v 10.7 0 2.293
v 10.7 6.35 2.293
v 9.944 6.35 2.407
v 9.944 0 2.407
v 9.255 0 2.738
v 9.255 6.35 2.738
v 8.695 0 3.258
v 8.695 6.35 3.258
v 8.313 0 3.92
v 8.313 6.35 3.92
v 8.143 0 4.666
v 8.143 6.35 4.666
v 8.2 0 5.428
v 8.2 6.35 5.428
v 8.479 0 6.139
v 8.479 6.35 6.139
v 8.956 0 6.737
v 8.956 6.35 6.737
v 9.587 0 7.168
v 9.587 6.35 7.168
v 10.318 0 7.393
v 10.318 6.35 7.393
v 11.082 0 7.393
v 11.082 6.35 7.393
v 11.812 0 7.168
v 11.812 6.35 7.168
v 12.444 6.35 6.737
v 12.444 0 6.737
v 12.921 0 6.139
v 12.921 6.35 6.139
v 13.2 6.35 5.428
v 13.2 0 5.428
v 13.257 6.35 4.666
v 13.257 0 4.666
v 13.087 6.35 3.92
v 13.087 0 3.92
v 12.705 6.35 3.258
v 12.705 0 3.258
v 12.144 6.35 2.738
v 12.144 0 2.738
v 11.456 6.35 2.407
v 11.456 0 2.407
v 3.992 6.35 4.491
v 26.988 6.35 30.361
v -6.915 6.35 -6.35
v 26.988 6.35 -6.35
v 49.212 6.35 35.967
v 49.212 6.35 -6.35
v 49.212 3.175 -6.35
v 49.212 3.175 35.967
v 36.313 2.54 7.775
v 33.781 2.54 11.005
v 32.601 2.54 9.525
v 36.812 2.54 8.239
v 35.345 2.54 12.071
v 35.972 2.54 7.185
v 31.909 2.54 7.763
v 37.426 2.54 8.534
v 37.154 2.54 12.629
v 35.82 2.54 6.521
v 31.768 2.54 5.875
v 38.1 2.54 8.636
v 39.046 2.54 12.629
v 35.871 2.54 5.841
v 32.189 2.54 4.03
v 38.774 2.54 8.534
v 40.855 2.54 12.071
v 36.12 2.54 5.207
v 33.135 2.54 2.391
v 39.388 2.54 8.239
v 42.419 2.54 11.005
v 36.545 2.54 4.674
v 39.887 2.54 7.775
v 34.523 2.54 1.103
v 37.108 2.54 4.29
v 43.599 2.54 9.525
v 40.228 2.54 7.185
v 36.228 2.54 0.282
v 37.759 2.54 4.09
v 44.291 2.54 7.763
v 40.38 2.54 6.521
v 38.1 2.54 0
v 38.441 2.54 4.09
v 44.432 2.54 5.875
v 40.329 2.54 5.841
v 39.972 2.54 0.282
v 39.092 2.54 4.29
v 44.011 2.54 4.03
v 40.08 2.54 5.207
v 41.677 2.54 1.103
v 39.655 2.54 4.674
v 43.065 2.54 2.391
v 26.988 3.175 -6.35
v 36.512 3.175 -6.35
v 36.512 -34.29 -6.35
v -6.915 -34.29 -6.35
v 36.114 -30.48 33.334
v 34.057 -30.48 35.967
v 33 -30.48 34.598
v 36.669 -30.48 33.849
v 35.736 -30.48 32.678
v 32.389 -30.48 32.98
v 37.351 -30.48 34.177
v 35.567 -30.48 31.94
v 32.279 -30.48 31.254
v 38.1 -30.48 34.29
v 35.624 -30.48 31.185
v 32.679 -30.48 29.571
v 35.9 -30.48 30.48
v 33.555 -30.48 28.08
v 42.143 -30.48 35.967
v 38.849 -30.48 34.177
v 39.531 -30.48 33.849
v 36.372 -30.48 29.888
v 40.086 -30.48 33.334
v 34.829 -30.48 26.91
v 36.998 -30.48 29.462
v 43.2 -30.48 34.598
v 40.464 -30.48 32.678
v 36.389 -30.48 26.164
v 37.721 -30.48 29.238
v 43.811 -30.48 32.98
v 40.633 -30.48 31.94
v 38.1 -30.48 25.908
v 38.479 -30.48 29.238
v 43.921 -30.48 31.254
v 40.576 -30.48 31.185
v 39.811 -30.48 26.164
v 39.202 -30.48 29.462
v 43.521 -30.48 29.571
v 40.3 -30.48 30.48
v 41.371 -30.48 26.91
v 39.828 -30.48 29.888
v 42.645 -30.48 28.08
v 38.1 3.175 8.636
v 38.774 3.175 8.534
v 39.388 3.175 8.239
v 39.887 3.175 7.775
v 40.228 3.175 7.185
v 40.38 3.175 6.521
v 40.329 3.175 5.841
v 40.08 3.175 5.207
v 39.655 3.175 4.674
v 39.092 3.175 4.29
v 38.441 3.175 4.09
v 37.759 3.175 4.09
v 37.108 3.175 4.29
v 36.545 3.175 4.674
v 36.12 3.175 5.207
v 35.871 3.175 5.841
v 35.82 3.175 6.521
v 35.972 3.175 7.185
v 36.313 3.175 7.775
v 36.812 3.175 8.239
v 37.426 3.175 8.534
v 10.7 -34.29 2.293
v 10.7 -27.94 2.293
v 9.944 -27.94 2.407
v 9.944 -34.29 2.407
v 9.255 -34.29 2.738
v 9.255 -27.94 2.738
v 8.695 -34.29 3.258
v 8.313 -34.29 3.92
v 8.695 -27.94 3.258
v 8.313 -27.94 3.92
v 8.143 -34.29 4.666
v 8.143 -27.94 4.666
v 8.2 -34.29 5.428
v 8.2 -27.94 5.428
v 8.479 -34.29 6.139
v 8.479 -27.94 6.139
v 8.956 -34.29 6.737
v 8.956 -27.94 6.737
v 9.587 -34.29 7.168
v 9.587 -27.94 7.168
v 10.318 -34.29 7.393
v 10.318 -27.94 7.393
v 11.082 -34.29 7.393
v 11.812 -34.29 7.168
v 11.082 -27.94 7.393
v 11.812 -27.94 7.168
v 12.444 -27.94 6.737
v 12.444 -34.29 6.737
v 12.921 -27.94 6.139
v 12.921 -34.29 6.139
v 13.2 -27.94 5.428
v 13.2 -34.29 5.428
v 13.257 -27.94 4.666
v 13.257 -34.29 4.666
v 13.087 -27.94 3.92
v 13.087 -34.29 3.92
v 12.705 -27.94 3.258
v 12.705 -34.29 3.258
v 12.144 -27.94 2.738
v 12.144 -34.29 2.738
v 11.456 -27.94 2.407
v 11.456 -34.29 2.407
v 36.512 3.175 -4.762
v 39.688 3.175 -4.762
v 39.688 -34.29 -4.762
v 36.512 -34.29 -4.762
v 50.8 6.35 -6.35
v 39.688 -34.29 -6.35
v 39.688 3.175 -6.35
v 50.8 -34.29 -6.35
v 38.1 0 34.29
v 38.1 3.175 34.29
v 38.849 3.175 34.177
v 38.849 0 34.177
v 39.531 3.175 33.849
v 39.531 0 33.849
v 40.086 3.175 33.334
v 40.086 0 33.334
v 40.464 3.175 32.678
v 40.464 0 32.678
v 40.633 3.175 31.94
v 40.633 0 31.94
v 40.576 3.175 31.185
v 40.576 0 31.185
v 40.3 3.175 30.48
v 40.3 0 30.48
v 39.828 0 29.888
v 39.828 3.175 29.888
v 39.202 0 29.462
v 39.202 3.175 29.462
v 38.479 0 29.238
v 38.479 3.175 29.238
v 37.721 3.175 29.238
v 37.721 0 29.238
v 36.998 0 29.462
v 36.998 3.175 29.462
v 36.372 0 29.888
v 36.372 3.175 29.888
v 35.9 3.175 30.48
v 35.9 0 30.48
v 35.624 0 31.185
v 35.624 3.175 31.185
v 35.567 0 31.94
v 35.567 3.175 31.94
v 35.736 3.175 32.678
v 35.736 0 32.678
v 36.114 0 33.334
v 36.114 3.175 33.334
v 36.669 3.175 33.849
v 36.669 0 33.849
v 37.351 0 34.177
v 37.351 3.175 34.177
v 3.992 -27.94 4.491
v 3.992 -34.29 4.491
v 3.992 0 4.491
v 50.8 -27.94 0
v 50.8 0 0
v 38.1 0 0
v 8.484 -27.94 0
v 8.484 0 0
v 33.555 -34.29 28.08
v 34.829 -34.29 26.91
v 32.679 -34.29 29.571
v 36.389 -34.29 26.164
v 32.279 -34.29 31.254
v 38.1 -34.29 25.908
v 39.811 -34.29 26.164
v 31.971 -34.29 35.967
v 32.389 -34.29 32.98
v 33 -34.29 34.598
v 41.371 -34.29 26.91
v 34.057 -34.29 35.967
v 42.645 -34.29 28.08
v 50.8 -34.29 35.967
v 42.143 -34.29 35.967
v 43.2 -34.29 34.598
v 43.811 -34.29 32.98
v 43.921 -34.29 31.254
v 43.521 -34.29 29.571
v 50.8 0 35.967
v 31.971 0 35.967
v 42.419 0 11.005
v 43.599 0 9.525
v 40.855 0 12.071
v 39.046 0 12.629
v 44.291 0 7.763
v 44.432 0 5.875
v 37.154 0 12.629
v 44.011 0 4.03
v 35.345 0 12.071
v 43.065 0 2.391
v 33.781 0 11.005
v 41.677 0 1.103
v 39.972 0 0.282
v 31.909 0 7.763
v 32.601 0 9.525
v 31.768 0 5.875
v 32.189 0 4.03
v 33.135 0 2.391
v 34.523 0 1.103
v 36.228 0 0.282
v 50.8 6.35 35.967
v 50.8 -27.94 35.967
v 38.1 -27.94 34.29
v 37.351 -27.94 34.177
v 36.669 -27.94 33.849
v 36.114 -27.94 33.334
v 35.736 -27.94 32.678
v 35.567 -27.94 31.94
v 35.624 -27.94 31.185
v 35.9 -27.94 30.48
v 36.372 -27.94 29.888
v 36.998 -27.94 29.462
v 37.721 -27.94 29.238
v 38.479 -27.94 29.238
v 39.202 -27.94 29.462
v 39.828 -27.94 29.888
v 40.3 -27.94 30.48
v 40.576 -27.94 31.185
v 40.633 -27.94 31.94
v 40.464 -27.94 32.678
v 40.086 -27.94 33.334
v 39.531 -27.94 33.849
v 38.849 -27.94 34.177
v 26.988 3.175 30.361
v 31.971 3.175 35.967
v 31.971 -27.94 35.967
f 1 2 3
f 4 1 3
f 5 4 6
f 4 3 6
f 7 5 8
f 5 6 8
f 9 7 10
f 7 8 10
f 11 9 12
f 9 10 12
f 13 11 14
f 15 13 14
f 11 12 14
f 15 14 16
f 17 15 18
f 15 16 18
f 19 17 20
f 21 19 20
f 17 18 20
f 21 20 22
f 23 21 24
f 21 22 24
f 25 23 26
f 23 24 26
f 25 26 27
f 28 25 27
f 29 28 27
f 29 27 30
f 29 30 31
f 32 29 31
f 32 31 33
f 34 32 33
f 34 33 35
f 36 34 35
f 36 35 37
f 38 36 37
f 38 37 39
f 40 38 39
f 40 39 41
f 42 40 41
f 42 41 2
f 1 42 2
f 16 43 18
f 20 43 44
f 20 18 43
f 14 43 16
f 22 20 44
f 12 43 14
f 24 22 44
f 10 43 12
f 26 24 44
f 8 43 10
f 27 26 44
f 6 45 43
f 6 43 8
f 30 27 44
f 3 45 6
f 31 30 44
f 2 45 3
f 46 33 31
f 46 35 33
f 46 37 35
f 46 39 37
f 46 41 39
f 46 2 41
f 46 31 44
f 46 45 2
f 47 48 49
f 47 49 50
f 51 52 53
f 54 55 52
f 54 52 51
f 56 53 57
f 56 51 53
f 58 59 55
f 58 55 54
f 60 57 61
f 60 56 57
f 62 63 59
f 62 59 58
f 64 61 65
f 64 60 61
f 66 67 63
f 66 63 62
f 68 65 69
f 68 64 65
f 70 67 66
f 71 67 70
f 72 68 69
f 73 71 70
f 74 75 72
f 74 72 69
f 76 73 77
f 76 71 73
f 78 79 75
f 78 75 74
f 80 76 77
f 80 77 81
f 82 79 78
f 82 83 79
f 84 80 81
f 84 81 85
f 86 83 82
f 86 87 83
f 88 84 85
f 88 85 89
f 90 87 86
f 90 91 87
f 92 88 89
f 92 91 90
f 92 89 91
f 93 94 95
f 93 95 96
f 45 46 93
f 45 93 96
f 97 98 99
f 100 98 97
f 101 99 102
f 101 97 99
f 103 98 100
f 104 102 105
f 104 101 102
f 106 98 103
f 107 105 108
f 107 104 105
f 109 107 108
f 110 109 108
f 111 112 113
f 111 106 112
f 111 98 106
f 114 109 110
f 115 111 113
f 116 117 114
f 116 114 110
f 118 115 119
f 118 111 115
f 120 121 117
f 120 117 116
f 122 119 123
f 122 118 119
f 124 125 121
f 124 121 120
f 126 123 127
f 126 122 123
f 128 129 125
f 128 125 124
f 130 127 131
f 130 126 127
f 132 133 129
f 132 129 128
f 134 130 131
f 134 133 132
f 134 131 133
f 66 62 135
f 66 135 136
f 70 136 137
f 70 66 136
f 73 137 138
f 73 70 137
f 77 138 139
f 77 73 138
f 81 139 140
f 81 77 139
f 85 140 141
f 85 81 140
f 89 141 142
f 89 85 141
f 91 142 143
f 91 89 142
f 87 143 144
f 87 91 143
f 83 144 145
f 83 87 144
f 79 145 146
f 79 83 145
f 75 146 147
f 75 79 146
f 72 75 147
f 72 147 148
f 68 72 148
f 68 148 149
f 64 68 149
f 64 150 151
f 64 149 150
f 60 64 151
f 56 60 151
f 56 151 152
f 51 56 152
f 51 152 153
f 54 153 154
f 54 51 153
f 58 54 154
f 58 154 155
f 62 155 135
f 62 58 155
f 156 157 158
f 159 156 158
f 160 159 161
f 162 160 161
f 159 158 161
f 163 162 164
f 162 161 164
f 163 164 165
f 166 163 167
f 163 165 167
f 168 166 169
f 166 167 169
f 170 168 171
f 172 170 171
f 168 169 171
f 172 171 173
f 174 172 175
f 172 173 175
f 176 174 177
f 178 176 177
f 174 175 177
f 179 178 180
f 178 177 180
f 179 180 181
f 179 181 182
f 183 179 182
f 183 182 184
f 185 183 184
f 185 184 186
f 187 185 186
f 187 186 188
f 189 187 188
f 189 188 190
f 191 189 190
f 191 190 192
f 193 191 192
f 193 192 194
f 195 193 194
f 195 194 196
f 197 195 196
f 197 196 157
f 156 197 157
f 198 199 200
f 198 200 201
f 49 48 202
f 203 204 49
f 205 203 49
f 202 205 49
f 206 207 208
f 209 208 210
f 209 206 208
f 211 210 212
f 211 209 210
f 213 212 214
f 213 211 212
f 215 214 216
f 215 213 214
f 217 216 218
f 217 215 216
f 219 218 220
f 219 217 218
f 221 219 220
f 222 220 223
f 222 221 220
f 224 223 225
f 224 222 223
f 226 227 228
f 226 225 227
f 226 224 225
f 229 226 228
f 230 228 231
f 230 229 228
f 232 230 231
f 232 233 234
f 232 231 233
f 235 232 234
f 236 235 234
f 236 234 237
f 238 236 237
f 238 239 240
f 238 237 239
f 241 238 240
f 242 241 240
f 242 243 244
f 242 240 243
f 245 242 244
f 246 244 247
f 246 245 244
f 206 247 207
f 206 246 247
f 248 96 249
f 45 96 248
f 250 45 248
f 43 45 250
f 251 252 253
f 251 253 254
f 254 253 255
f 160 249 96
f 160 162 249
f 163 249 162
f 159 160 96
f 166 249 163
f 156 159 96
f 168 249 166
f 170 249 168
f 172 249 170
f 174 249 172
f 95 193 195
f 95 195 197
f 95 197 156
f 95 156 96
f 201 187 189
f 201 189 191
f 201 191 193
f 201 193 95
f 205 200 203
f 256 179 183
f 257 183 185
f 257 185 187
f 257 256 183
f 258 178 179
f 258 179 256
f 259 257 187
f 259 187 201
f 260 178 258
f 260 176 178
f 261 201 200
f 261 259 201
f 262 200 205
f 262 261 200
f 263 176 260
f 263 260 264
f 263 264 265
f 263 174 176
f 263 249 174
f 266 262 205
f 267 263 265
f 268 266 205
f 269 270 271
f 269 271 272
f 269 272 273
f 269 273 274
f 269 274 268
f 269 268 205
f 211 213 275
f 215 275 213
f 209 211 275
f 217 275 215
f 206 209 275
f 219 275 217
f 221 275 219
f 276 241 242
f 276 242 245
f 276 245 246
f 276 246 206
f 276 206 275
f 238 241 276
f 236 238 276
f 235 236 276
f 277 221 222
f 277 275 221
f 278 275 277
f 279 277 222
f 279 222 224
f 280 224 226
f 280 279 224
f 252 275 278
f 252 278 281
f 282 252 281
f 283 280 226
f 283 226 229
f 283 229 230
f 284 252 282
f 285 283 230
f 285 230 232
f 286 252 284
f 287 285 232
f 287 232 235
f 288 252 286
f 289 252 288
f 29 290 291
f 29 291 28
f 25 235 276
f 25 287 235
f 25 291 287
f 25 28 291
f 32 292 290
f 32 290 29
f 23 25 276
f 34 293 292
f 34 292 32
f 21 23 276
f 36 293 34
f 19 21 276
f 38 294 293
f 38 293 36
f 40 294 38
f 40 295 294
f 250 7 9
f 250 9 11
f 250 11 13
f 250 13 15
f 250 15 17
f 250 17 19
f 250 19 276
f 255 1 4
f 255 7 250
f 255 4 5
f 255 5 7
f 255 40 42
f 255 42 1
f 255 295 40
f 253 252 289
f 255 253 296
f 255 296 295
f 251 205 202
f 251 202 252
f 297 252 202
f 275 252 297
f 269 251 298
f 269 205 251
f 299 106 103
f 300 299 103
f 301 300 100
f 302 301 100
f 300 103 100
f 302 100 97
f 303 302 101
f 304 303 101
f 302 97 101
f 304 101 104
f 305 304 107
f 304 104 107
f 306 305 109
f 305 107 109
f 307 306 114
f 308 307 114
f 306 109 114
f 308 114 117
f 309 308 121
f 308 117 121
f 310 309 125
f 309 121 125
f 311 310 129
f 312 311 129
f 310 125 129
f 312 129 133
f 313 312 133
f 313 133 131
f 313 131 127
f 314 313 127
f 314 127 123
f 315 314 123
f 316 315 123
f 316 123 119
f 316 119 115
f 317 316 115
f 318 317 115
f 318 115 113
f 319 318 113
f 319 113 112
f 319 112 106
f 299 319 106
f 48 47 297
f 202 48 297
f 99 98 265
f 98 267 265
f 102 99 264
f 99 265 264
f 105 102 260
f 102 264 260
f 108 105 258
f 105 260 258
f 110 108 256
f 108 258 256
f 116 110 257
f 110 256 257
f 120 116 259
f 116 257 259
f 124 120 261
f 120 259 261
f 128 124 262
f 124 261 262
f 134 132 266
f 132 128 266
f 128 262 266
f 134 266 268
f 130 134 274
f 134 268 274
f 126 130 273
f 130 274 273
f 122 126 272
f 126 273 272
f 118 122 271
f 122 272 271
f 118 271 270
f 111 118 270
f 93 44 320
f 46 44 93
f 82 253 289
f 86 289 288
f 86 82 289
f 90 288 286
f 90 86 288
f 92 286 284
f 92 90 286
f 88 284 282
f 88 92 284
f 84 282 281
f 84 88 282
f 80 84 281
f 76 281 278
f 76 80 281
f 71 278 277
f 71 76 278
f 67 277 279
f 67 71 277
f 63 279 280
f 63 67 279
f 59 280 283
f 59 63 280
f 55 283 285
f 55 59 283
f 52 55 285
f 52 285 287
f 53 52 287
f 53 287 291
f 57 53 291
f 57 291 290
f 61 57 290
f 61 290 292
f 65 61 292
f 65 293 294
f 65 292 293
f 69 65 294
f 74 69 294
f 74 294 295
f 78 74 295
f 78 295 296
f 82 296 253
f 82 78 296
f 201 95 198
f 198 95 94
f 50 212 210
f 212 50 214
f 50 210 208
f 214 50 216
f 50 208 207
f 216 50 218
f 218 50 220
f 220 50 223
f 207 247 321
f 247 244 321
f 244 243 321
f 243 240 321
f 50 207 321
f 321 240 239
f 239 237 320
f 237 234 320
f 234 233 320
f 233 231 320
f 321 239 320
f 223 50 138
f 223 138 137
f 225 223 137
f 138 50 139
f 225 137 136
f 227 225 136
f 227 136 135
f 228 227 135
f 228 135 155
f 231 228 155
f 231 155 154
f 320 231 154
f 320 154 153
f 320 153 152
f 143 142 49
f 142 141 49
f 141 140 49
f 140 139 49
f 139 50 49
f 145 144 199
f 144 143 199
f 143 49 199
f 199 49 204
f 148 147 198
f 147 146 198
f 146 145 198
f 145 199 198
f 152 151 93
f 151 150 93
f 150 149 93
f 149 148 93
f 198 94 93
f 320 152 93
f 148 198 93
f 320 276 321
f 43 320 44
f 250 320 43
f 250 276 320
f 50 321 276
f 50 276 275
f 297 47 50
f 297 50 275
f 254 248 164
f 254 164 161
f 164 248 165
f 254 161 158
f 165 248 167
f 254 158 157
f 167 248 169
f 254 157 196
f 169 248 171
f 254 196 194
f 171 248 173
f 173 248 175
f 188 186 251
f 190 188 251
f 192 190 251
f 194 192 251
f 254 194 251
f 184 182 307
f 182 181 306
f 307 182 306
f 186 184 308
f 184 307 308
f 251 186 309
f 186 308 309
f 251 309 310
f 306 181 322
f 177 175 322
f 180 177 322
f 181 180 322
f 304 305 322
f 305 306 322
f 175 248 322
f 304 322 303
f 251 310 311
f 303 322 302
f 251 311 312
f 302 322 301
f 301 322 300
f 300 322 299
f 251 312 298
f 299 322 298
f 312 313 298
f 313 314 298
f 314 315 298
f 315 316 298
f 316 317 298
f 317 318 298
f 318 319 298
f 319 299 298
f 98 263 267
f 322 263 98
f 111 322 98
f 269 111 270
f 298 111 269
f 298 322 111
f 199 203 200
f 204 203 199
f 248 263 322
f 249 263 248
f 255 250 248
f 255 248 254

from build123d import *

# Parameters (mm, degrees)
SKETCH2_R               = 2.286
SKETCH2_R_2             = 2.54
BOSS_EXTRUDE1_DEPTH     = 6.35
SKETCH3_W               = 50.8
SKETCH3_H               = 27.94
BOSS_EXTRUDE2_DEPTH     = 6.35
SKETCH5_W               = 50.8
SKETCH5_H               = 6.35
BOSS_EXTRUDE3_DEPTH     = 6.35
CUT_EXTRUDE1_DEPTH      = 38.1
CUT_EXTRUDE1_DEPTH_BACK = 2.54
SKETCH6_R               = 6.35
BOSS_EXTRUDE4_START     = 6.35
SKETCH7_W               = 50.8
SKETCH7_H               = 6.35
SKETCH7_R               = 2.54
BOSS_EXTRUDE4_DEPTH     = 6.35
CUT_EXTRUDE2_DEPTH      = 3.175
SKETCH9_R               = 2.564291027
CUT_EXTRUDE3_DEPTH      = 127
SKETCH11_W              = 3.175
SKETCH11_H              = 37.465
CUT_EXTRUDE4_DEPTH      = 1.5875
SKETCH16_R              = 5.842
CUT_EXTRUDE7_DEPTH      = 3.81
SKETCH17_W              = 19.191430616
SKETCH17_H              = 21.182889484
CUT_EXTRUDE8_DEPTH      = 87.593141183
BOSS_EXTRUDE5_REACH     = 76.336


with BuildPart() as part:
    # Sketch2 → Boss-Extrude1 (new body)
    with BuildSketch(Plane(origin=(0, 0, 0), x_dir=(1, 0, 0), z_dir=(0, 1, 0))):
        Polygon((0, 0), (50.8, 0), (50.8, -57.15), align=None)
        with Locations(Location((38.1, -6.35, 0), (0, 0, 270))):
            Circle(SKETCH2_R, mode=Mode.SUBTRACT)
        with Locations(Location((38.1, -31.75, 0), (0, 0, 270))):
            Circle(SKETCH2_R_2, mode=Mode.SUBTRACT)
        with Locations(Location((10.699885901, -4.857157432, 0), (0, 0, 270))):
            Circle(SKETCH2_R_2, mode=Mode.SUBTRACT)
    extrude(amount=BOSS_EXTRUDE1_DEPTH)



with BuildPart() as body_2:
    # Sketch3 → Boss-Extrude2 (new body)
    with BuildSketch(Plane(origin=(0, 0, 0), x_dir=(-1, 0, 0), z_dir=(0, 0, -1))):
        with Locations((-25.4, -13.97)):
            Rectangle(SKETCH3_W, SKETCH3_H)
    extrude(amount=BOSS_EXTRUDE2_DEPTH)


with BuildPart() as part_1:
    add(part.part)

    add(body_2.part)  # Boss-Extrude3 merges body 2
    # Sketch5 → Boss-Extrude3 (add)
    with BuildSketch(Plane(origin=(0, 6.35, 0), x_dir=(1, 0, 0), z_dir=(0, 1, 0))):
        with Locations((25.4, 3.175)):
            Rectangle(SKETCH5_W, SKETCH5_H)
    extrude(amount=-BOSS_EXTRUDE3_DEPTH)

    # Sketch6 → Cut-Extrude1 (cut, two sides: drawn at the far end of the back side and taken through both)
    with BuildSketch(Plane.XZ.offset(-CUT_EXTRUDE1_DEPTH_BACK)):
        with Locations(Location((38.1, 6.35, 0), (0, 0, 270))):
            Circle(SKETCH6_R)
    extrude(amount=CUT_EXTRUDE1_DEPTH + CUT_EXTRUDE1_DEPTH_BACK, mode=Mode.SUBTRACT)

    # Sketch7 → Boss-Extrude4 (add)
    # profile 1 of 2: a face of its own
    with BuildSketch(Plane.XZ.offset(27.94).offset(BOSS_EXTRUDE4_START)):
        with Locations((25.4, -3.175)):
            Rectangle(SKETCH7_W, SKETCH7_H)
    # profile 2 of 2: a face of its own
    with BuildSketch(Plane.XZ.offset(27.94).offset(BOSS_EXTRUDE4_START)):
        Polygon((50.8, 57.15), (0, 0), (50.8, 0), align=None)
        with Locations(Location((38.1, 31.75, 0), (0, 0, 90))):
            Circle(SKETCH7_R, mode=Mode.SUBTRACT)
    extrude(amount=-BOSS_EXTRUDE4_DEPTH)

    # Sketch8 → Cut-Extrude2 (cut)
    with BuildSketch(Plane(origin=(0, 6.35, 0), x_dir=(1, 0, 0), z_dir=(0, 1, 0))):
        Polygon((26.9875, 6.35), (49.2125, 6.35), (49.2125, -55.3640625), (26.9875, -30.3609375), align=None)
    extrude(amount=-CUT_EXTRUDE2_DEPTH, mode=Mode.SUBTRACT)

    # Sketch9 → Cut-Extrude3 (cut)
    with BuildSketch(Plane(origin=(0, 6.35, 0), x_dir=(1, 0, 0), z_dir=(0, 1, 0))):
        with Locations(Location((10.699885901, -4.857157432, 0), (0, 0, 90))):
            Circle(SKETCH9_R)
    extrude(amount=-CUT_EXTRUDE3_DEPTH, mode=Mode.SUBTRACT)

    # Sketch11 → Cut-Extrude4 (cut)
    with BuildSketch(Plane(origin=(0, 0, -6.35), x_dir=(-1, 0, 0), z_dir=(0, 0, -1))):
        with Locations((-38.1, -15.5575)):
            Rectangle(SKETCH11_W, SKETCH11_H)
    extrude(amount=-CUT_EXTRUDE4_DEPTH, mode=Mode.SUBTRACT)

    # Sketch16 → Cut-Extrude7 (cut)
    with BuildSketch(Plane.XZ.offset(34.29)):
        with Locations(Location((38.1, 31.75, 0), (0, 0, 270))):
            Circle(SKETCH16_R)
    extrude(amount=-CUT_EXTRUDE7_DEPTH, mode=Mode.SUBTRACT)

    # Sketch17 → Cut-Extrude8 (cut, through all)
    with BuildSketch(Plane(origin=(0, 6.35, 0), x_dir=(1, 0, 0), z_dir=(0, 1, 0))):
        with Locations((41.204284692, -46.558555258)):
            Rectangle(SKETCH17_W, SKETCH17_H)
        Polygon((3.992356435, -4.491400989), (14.833757424, 6.35), (0, 6.35), (0, 0), align=None)
    extrude(amount=-CUT_EXTRUDE8_DEPTH, mode=Mode.SUBTRACT)

    # Boss-Extrude5: up to this face of the body (flat: up to its plane)
    boss_extrude5_end = Plane(part_1.part.faces().sort_by_distance((32.258274594, -34.29, 11.14322166))[0])
    # Sketch18 → Boss-Extrude5 (add, up to the picked face)
    with BuildSketch(Plane(origin=(0, 6.35, 0), x_dir=(1, 0, 0), z_dir=(0, 1, 0)), mode=Mode.PRIVATE) as boss_extrude5_sk1:
        Polygon((14.833757424, 6.35), (-6.915485897, 6.35), (3.992356435, -4.491400989), align=None)
    boss_extrude5_tool1 = split(extrude(boss_extrude5_sk1.sketch, amount=-BOSS_EXTRUDE5_REACH, mode=Mode.PRIVATE), bisect_by=boss_extrude5_end, keep=Keep.BOTH, mode=Mode.PRIVATE)
    add(boss_extrude5_tool1.solids().sort_by(Axis((3.970209, 6.35, -2.7362), (0, -1, 0)))[0])


solid = part_1.part
